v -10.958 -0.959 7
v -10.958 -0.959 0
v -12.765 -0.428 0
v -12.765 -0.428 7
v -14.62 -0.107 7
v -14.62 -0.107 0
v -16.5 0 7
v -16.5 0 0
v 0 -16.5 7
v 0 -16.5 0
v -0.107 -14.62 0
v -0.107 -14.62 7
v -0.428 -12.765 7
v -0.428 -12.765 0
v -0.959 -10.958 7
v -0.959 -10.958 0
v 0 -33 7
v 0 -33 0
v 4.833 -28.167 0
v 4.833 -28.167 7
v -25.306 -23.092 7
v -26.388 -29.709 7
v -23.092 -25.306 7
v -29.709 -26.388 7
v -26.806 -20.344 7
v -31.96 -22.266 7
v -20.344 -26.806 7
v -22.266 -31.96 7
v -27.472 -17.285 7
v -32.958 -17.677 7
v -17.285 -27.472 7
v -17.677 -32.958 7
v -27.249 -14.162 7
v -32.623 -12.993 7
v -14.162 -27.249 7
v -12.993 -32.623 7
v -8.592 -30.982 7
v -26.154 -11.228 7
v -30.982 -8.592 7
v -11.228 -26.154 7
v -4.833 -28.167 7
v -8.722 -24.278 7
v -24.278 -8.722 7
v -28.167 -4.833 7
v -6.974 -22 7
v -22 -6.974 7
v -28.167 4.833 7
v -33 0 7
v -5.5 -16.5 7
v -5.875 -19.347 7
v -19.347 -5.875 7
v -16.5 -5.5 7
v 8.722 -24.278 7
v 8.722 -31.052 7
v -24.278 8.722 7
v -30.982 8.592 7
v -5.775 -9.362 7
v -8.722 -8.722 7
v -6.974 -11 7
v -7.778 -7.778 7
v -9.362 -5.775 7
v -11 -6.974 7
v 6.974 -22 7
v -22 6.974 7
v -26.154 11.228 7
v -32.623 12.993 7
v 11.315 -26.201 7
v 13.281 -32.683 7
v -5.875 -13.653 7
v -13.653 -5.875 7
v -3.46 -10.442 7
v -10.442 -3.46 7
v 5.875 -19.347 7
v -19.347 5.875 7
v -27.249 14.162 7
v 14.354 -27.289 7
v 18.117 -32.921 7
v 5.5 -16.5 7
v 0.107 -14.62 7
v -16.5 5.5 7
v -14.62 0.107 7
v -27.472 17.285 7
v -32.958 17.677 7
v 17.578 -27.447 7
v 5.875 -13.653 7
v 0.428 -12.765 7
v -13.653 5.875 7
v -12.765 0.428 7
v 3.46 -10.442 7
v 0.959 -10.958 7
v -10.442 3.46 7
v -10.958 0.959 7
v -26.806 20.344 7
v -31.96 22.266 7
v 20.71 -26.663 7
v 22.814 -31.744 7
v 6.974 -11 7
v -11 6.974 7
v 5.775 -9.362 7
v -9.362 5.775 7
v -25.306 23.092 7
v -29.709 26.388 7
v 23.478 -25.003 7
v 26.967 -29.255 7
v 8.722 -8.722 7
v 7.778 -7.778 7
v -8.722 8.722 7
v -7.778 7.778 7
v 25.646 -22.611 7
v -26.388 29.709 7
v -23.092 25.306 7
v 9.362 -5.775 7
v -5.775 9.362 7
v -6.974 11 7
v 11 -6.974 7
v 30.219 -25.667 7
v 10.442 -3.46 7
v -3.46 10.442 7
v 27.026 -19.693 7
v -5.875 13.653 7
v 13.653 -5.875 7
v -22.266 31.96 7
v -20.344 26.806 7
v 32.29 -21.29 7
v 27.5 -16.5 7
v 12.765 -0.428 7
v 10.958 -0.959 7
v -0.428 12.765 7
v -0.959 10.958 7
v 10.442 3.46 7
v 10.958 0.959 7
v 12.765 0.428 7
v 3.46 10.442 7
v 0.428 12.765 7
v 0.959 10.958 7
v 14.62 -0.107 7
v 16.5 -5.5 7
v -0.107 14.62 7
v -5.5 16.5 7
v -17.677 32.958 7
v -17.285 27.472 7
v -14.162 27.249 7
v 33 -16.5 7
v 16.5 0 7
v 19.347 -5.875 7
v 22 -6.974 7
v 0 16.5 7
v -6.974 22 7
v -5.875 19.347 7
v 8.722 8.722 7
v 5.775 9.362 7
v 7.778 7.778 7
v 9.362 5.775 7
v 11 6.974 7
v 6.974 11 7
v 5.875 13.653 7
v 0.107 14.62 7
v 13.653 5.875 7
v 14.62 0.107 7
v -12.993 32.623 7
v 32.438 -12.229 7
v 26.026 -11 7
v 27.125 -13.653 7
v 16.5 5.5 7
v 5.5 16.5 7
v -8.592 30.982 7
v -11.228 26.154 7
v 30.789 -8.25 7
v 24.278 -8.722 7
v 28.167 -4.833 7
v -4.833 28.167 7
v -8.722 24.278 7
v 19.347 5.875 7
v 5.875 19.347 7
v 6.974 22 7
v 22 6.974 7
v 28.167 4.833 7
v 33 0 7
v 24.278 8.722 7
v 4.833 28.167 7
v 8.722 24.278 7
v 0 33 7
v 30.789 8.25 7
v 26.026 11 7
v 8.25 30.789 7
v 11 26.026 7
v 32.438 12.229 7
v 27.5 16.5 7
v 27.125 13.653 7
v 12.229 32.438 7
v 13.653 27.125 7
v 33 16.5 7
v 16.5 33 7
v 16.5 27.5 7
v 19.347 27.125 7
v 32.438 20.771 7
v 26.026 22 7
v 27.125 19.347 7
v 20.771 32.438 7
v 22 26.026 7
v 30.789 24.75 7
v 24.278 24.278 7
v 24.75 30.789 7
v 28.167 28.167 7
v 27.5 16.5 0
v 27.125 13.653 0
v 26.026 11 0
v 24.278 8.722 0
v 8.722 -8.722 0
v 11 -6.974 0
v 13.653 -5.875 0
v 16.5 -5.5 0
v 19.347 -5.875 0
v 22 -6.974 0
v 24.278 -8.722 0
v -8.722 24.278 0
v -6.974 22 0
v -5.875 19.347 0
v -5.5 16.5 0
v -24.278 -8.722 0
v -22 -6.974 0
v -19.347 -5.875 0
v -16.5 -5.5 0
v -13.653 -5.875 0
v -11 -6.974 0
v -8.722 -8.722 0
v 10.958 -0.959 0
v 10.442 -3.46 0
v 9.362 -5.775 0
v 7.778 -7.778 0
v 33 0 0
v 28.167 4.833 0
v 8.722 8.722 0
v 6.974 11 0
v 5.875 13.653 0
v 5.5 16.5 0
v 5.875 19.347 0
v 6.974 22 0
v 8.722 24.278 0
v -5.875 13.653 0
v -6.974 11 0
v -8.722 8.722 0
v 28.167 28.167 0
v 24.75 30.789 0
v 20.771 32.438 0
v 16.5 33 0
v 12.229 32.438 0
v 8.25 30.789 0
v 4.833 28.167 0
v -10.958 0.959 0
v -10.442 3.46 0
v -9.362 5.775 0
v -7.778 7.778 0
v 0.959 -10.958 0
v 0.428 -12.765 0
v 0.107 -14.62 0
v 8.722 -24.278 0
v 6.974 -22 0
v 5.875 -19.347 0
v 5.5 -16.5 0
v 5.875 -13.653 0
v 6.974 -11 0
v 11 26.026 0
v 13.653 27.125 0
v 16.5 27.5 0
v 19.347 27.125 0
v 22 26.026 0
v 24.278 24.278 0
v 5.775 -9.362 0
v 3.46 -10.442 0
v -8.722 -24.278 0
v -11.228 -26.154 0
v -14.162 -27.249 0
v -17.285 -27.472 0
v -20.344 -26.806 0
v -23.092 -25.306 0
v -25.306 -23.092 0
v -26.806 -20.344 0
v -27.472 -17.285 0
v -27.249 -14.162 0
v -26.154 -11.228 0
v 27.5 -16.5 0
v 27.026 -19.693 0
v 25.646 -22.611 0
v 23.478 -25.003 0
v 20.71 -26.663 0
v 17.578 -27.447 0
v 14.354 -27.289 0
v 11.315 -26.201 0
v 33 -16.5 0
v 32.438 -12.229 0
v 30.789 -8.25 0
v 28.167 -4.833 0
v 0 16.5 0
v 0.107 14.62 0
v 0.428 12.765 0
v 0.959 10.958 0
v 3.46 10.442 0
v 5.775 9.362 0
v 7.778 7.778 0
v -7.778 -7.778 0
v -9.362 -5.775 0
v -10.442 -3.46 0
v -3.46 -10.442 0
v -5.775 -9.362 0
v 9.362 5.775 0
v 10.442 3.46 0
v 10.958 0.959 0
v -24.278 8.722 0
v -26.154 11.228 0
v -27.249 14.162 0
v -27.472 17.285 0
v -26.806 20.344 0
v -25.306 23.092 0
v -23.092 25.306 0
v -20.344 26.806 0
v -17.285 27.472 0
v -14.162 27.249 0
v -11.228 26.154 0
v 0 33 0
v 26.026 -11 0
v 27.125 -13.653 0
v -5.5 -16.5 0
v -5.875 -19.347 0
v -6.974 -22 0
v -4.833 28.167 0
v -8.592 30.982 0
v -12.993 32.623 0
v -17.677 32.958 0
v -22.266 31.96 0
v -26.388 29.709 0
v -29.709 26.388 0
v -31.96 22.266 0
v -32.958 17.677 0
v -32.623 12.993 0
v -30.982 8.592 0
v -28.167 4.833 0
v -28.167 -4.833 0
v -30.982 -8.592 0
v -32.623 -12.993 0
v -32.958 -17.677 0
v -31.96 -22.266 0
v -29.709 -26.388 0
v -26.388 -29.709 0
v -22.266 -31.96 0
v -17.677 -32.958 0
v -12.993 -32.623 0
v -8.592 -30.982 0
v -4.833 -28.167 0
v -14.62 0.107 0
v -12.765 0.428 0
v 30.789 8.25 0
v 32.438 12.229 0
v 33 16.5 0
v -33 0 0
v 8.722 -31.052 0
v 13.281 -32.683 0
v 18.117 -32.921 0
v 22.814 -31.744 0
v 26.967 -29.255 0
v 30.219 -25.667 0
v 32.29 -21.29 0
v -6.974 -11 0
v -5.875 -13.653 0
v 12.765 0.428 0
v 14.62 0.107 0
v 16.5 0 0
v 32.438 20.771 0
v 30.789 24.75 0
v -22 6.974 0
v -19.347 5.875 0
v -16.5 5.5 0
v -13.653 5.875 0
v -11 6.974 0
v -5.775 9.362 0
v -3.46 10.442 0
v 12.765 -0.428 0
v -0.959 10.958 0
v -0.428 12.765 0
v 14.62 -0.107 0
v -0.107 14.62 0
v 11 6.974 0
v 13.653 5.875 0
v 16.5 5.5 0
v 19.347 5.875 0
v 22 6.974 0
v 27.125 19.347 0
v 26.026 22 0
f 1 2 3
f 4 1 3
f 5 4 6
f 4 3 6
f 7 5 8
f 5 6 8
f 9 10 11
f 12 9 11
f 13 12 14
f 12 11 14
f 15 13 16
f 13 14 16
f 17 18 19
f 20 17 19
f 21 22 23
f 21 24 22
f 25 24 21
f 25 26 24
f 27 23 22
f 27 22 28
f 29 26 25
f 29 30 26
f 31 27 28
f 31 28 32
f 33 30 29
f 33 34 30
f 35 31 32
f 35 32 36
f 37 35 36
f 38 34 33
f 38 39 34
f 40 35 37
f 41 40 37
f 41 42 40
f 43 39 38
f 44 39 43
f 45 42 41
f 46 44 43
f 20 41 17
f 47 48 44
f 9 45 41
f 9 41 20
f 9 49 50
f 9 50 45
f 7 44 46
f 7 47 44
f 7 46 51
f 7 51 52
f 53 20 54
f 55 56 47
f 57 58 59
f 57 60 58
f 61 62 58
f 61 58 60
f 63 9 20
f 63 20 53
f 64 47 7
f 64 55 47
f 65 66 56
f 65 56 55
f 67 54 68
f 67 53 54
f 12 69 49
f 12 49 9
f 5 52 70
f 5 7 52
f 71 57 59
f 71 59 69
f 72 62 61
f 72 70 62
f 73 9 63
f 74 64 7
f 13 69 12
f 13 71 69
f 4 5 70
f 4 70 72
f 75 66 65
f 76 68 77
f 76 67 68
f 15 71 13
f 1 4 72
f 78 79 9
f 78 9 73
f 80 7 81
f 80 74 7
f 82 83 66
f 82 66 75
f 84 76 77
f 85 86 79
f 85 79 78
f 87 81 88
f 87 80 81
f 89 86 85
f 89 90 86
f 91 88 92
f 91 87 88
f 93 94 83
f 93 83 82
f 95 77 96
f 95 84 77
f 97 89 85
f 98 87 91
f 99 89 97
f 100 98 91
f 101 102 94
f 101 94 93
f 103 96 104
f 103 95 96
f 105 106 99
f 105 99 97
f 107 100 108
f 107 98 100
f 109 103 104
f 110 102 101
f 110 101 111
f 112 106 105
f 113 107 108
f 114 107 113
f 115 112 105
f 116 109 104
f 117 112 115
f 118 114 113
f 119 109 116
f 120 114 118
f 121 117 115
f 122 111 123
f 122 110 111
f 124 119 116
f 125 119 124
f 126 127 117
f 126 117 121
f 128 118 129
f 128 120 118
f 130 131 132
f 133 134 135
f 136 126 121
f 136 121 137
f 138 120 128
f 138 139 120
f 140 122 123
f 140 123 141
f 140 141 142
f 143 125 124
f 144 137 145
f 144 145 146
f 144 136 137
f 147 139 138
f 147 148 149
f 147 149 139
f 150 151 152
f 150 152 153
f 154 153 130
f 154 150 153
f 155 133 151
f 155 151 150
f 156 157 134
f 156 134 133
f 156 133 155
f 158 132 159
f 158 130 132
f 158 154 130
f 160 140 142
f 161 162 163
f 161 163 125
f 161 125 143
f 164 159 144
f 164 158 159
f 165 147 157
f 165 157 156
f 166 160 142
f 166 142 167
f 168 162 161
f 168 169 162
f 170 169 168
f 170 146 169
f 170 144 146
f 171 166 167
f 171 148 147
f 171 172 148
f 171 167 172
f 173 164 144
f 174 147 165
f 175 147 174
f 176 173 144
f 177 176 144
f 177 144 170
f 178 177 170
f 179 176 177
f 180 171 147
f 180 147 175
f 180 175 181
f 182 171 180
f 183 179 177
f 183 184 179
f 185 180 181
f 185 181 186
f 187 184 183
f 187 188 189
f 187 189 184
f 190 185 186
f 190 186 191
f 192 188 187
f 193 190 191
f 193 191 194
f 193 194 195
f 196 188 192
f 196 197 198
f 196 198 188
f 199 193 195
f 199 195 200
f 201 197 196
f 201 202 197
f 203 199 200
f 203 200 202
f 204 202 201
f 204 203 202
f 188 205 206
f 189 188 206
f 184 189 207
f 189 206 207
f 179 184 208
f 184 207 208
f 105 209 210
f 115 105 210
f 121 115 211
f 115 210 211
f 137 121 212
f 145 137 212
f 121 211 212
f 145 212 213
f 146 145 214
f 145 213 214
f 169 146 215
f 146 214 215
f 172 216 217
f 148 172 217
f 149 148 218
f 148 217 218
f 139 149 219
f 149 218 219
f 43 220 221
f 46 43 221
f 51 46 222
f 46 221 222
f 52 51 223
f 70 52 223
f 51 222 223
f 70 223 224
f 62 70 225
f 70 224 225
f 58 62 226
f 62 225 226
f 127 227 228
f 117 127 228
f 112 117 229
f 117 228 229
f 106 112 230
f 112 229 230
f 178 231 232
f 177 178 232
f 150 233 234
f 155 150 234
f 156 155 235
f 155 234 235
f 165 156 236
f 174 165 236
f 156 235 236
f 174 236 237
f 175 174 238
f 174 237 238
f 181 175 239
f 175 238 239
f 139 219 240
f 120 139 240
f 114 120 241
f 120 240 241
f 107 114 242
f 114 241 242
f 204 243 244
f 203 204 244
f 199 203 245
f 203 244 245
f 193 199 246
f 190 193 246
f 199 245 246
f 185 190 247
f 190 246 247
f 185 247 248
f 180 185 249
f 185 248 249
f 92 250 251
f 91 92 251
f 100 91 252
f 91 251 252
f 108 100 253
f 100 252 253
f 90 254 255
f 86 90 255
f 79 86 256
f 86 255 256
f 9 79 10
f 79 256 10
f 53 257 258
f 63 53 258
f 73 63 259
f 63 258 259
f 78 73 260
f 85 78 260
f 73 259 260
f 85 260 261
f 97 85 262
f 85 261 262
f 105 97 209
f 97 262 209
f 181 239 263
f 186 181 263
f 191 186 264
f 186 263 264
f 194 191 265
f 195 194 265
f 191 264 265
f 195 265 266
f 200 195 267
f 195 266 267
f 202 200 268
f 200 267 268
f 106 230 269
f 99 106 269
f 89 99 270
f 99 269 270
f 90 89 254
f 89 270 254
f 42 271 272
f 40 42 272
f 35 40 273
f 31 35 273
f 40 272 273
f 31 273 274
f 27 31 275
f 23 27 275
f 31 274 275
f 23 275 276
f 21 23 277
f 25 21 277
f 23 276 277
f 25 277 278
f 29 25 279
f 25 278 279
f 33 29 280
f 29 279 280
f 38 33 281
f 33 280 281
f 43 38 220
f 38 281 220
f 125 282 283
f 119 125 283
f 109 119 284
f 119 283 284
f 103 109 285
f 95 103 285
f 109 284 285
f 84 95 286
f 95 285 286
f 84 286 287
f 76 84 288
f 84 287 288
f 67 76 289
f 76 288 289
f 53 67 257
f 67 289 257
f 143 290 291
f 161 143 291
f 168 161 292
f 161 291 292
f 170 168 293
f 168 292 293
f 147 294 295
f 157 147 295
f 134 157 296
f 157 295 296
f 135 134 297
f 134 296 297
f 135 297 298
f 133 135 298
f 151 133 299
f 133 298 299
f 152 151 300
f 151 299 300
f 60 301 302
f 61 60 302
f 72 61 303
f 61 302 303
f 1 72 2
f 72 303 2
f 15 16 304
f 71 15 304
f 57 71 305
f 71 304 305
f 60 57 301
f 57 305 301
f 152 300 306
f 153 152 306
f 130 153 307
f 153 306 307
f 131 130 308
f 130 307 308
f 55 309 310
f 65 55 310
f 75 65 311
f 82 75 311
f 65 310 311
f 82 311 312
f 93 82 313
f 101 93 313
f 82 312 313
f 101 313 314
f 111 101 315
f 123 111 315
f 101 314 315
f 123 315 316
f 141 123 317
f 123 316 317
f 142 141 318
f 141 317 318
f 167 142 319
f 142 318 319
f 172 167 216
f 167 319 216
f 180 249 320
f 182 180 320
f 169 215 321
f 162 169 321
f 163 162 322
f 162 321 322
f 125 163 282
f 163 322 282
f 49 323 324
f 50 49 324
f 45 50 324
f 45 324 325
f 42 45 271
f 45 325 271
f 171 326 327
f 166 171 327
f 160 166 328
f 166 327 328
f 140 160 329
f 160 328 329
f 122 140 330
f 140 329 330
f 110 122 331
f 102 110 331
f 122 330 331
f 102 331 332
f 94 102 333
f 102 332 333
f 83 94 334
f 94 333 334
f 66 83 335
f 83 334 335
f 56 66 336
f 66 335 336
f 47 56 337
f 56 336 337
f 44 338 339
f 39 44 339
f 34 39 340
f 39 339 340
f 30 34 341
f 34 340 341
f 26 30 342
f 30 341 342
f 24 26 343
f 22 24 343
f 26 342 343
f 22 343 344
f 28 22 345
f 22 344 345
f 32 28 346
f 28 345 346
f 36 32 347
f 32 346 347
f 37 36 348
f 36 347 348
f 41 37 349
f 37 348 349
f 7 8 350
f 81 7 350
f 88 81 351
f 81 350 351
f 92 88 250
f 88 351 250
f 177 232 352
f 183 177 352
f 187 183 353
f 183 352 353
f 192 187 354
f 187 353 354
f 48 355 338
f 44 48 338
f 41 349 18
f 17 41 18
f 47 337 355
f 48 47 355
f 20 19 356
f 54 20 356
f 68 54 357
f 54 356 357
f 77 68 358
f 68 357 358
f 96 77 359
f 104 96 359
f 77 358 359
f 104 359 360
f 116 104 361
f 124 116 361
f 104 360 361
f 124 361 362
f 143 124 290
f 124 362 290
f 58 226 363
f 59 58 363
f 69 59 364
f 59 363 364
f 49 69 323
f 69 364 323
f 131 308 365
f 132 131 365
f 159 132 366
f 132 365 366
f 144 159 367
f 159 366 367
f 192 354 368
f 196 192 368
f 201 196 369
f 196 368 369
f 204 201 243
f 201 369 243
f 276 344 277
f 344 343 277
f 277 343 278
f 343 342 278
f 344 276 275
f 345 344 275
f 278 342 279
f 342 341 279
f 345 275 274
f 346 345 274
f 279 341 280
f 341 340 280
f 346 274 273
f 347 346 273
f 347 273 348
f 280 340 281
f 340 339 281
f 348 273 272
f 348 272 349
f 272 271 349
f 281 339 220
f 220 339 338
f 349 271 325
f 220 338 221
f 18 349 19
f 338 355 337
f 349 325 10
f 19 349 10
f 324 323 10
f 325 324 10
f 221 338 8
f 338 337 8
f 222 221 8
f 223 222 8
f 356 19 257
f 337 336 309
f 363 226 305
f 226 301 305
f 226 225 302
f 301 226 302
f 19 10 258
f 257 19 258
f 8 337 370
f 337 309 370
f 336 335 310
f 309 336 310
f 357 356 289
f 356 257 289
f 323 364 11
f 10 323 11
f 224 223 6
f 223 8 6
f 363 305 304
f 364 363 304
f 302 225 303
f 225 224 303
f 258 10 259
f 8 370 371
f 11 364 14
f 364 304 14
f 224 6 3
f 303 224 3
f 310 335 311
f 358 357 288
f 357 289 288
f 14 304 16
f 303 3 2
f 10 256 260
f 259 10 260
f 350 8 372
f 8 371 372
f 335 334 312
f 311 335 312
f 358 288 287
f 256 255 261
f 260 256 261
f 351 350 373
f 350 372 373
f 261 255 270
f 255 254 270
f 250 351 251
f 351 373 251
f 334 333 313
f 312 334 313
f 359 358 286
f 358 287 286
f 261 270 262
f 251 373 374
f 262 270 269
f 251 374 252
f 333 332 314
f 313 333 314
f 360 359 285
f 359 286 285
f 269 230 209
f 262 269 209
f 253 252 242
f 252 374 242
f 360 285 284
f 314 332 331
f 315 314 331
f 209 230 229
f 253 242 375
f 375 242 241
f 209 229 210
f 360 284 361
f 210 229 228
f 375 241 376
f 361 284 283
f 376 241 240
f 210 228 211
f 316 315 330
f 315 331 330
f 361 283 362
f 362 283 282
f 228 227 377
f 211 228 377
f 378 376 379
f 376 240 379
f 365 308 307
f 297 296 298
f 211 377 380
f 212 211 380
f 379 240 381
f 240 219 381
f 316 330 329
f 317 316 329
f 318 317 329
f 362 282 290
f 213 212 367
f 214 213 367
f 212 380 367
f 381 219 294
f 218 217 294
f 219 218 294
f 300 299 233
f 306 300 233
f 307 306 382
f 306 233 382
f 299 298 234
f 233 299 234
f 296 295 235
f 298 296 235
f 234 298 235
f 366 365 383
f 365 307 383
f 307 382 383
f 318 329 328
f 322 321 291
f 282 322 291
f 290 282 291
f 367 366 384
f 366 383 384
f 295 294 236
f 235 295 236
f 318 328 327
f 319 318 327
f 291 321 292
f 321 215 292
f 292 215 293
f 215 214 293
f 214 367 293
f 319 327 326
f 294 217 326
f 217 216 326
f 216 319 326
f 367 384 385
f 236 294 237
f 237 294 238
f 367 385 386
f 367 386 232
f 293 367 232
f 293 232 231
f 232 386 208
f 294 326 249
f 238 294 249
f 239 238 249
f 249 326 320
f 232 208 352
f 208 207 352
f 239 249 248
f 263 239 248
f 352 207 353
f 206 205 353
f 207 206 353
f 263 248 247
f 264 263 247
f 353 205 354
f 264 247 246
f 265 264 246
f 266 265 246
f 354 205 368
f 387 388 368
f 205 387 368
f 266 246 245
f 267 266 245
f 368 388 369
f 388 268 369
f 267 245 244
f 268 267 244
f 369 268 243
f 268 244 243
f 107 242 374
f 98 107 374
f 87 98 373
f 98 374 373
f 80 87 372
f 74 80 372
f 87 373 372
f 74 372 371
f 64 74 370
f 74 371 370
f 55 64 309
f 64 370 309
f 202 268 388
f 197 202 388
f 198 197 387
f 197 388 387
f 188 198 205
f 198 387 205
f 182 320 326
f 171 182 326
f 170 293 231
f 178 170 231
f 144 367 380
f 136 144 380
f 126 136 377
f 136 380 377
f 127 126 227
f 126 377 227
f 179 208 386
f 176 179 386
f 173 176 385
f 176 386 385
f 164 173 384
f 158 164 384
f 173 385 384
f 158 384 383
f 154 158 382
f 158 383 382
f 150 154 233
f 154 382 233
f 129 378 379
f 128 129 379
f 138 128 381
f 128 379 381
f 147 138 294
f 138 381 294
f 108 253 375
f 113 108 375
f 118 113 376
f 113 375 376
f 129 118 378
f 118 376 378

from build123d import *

# Parameters (mm, degrees)
F1_DEPTH = 7


with BuildPart() as f1:
    # F0 (on Top) → F1 (new body)
    with BuildSketch(Plane.XY):
        with BuildLine():
            ThreePointArc((7.7781745931, 7.7781745931), (9.9694294001, 4.6487070714), (10.9581597192, 0.9585069475))
            ThreePointArc((10.9581597192, 0.9585069475), (13.6879398448, 0.2413925048), (16.5, 0))
            ThreePointArc((16.5, 0), (22.814276634, 1.2559877136), (28.1672618896, 4.8327381104))
            Line((28.1672618896, 4.8327381104), (24.2781745931, 8.7218254069))
            ThreePointArc((24.2781745931, 8.7218254069), (16.5, 5.5), (8.7218254069, 8.7218254069))
            Line((8.7218254069, 8.7218254069), (7.7781745931, 7.7781745931))
        make_face()
        with BuildLine():
            ThreePointArc((16.5, 0), (13.6879398448, -0.2413925048), (10.9581597192, -0.9585069475))
            ThreePointArc((10.9581597192, -0.9585069475), (9.9694294001, -4.6487070714), (7.7781745931, -7.7781745931))
            Line((7.7781745931, -7.7781745931), (8.7218254069, -8.7218254069))
            ThreePointArc((8.7218254069, -8.7218254069), (16.5, -5.5), (24.2781745931, -8.7218254069))
            Line((24.2781745931, -8.7218254069), (28.1672618896, -4.8327381104))
            ThreePointArc((28.1672618896, -4.8327381104), (22.814276634, -1.2559877136), (16.5, 0))
        make_face()
        with BuildLine():
            ThreePointArc((28.1672618896, 4.8327381104), (22.814276634, 1.2559877136), (16.5, 0))
            Line((16.5, 0), (33, 0))
            Line((33, 0), (28.1672618896, 4.8327381104))
        make_face()
        with BuildLine():
            Line((33, 0), (16.5, 0))
            ThreePointArc((16.5, 0), (22.814276634, -1.2559877136), (28.1672618896, -4.8327381104))
            Line((28.1672618896, -4.8327381104), (33, 0))
        make_face()
        with BuildLine():
            ThreePointArc((0.9585069475, 10.9581597192), (4.6487070714, 9.9694294001), (7.7781745931, 7.7781745931))
            Line((7.7781745931, 7.7781745931), (8.7218254069, 8.7218254069))
            ThreePointArc((8.7218254069, 8.7218254069), (5.5, 16.5), (8.7218254069, 24.2781745931))
            Line((8.7218254069, 24.2781745931), (4.8327381104, 28.1672618896))
            ThreePointArc((4.8327381104, 28.1672618896), (1.2559877136, 22.814276634), (0, 16.5))
            ThreePointArc((0, 16.5), (0.2413925048, 13.6879398448), (0.9585069475, 10.9581597192))
        make_face()
        with BuildLine():
            Line((8.7218254069, -8.7218254069), (7.7781745931, -7.7781745931))
            ThreePointArc((7.7781745931, -7.7781745931), (4.6487070714, -9.9694294001), (0.9585069475, -10.9581597192))
            ThreePointArc((0.9585069475, -10.9581597192), (0.2413925048, -13.6879398448), (0, -16.5))
            ThreePointArc((0, -16.5), (1.2559877136, -22.814276634), (4.8327381104, -28.1672618896))
            Line((4.8327381104, -28.1672618896), (8.7218254069, -24.2781745931))
            ThreePointArc((8.7218254069, -24.2781745931), (5.5, -16.5), (8.7218254069, -8.7218254069))
        make_face()
        with BuildLine():
            Line((24.2781745931, 8.7218254069), (28.1672618896, 4.8327381104))
            ThreePointArc((28.1672618896, 4.8327381104), (31.7440122864, 10.185723366), (33, 16.5))
            ThreePointArc((33, 16.5), (31.7440122864, 22.814276634), (28.1672618896, 28.1672618896))
            Line((28.1672618896, 28.1672618896), (24.2781745931, 24.2781745931))
            ThreePointArc((24.2781745931, 24.2781745931), (26.6626748576, 20.709517756), (27.5, 16.5))
            ThreePointArc((27.5, 16.5), (26.6626748576, 12.290482244), (24.2781745931, 8.7218254069))
        make_face()
        with BuildLine():
            ThreePointArc((33, -16.5), (31.7440122864, -10.185723366), (28.1672618896, -4.8327381104))
            Line((28.1672618896, -4.8327381104), (24.2781745931, -8.7218254069))
            ThreePointArc((24.2781745931, -8.7218254069), (26.6626748576, -12.290482244), (27.5, -16.5))
            ThreePointArc((27.5, -16.5), (20.709517756, -26.6626748576), (8.7218254069, -24.2781745931))
            Line((8.7218254069, -24.2781745931), (4.8327381104, -28.1672618896))
            ThreePointArc((4.8327381104, -28.1672618896), (22.814276634, -31.7440122864), (33, -16.5))
        make_face()
        with BuildLine():
            Line((-8.7218254069, -8.7218254069), (-7.7781745931, -7.7781745931))
            ThreePointArc((-7.7781745931, -7.7781745931), (-9.9694294001, -4.6487070714), (-10.9581597192, -0.9585069475))
            ThreePointArc((-10.9581597192, -0.9585069475), (-13.6879398448, -0.2413925048), (-16.5, 0))
            ThreePointArc((-16.5, 0), (-22.814276634, -1.2559877136), (-28.1672618896, -4.8327381104))
            Line((-28.1672618896, -4.8327381104), (-24.2781745931, -8.7218254069))
            ThreePointArc((-24.2781745931, -8.7218254069), (-16.5, -5.5), (-8.7218254069, -8.7218254069))
        make_face()
        with BuildLine():
            ThreePointArc((-0.9585069475, -10.9581597192), (-4.6487070714, -9.9694294001), (-7.7781745931, -7.7781745931))
            Line((-7.7781745931, -7.7781745931), (-8.7218254069, -8.7218254069))
            ThreePointArc((-8.7218254069, -8.7218254069), (-6.3373251424, -12.290482244), (-5.5, -16.5))
            ThreePointArc((-5.5, -16.5), (-6.3373251424, -20.709517756), (-8.7218254069, -24.2781745931))
            Line((-8.7218254069, -24.2781745931), (-4.8327381104, -28.1672618896))
            ThreePointArc((-4.8327381104, -28.1672618896), (-1.2559877136, -22.814276634), (0, -16.5))
            ThreePointArc((0, -16.5), (-0.2413925048, -13.6879398448), (-0.9585069475, -10.9581597192))
        make_face()
        with BuildLine():
            ThreePointArc((-16.5, 0), (-13.6879398448, 0.2413925048), (-10.9581597192, 0.9585069475))
            ThreePointArc((-10.9581597192, 0.9585069475), (-9.9694294001, 4.6487070714), (-7.7781745931, 7.7781745931))
            Line((-7.7781745931, 7.7781745931), (-8.7218254069, 8.7218254069))
            ThreePointArc((-8.7218254069, 8.7218254069), (-16.5, 5.5), (-24.2781745931, 8.7218254069))
            Line((-24.2781745931, 8.7218254069), (-28.1672618896, 4.8327381104))
            ThreePointArc((-28.1672618896, 4.8327381104), (-22.814276634, 1.2559877136), (-16.5, 0))
        make_face()
        with BuildLine():
            ThreePointArc((-28.1672618896, -4.8327381104), (-22.814276634, -1.2559877136), (-16.5, 0))
            Line((-16.5, 0), (-33, 0))
            Line((-33, 0), (-28.1672618896, -4.8327381104))
        make_face()
        with BuildLine():
            Line((-33, 0), (-16.5, 0))
            ThreePointArc((-16.5, 0), (-22.814276634, 1.2559877136), (-28.1672618896, 4.8327381104))
            Line((-28.1672618896, 4.8327381104), (-33, 0))
        make_face()
        with BuildLine():
            ThreePointArc((-7.7781745931, 7.7781745931), (-4.6487070714, 9.9694294001), (-0.9585069475, 10.9581597192))
            ThreePointArc((-0.9585069475, 10.9581597192), (-0.2413925048, 13.6879398448), (0, 16.5))
            ThreePointArc((0, 16.5), (-1.2559877136, 22.814276634), (-4.8327381104, 28.1672618896))
            Line((-4.8327381104, 28.1672618896), (-8.7218254069, 24.2781745931))
            ThreePointArc((-8.7218254069, 24.2781745931), (-6.3373251424, 20.709517756), (-5.5, 16.5))
            ThreePointArc((-5.5, 16.5), (-6.3373251424, 12.290482244), (-8.7218254069, 8.7218254069))
            Line((-8.7218254069, 8.7218254069), (-7.7781745931, 7.7781745931))
        make_face()
        with BuildLine():
            ThreePointArc((-4.8327381104, 28.1672618896), (-1.2559877136, 22.814276634), (0, 16.5))
            ThreePointArc((0, 16.5), (1.2559877136, 22.814276634), (4.8327381104, 28.1672618896))
            Line((4.8327381104, 28.1672618896), (0, 33))
            Line((0, 33), (-4.8327381104, 28.1672618896))
        make_face()
        with BuildLine():
            Line((4.8327381104, 28.1672618896), (8.7218254069, 24.2781745931))
            ThreePointArc((8.7218254069, 24.2781745931), (16.5, 27.5), (24.2781745931, 24.2781745931))
            Line((24.2781745931, 24.2781745931), (28.1672618896, 28.1672618896))
            ThreePointArc((28.1672618896, 28.1672618896), (16.5, 33), (4.8327381104, 28.1672618896))
        make_face()
        with BuildLine():
            ThreePointArc((4.8327381104, -28.1672618896), (1.2559877136, -22.814276634), (0, -16.5))
            ThreePointArc((0, -16.5), (-1.2559877136, -22.814276634), (-4.8327381104, -28.1672618896))
            Line((-4.8327381104, -28.1672618896), (0, -33))
            Line((0, -33), (4.8327381104, -28.1672618896))
        make_face()
        with BuildLine():
            ThreePointArc((-4.8327381104, 28.1672618896), (-28.1672618896, 28.1672618896), (-28.1672618896, 4.8327381104))
            Line((-28.1672618896, 4.8327381104), (-24.2781745931, 8.7218254069))
            ThreePointArc((-24.2781745931, 8.7218254069), (-24.2781745931, 24.2781745931), (-8.7218254069, 24.2781745931))
            Line((-8.7218254069, 24.2781745931), (-4.8327381104, 28.1672618896))
        make_face()
        with BuildLine():
            Line((-24.2781745931, -8.7218254069), (-28.1672618896, -4.8327381104))
            ThreePointArc((-28.1672618896, -4.8327381104), (-28.1672618896, -28.1672618896), (-4.8327381104, -28.1672618896))
            Line((-4.8327381104, -28.1672618896), (-8.7218254069, -24.2781745931))
            ThreePointArc((-8.7218254069, -24.2781745931), (-24.2781745931, -24.2781745931), (-24.2781745931, -8.7218254069))
        make_face()
    extrude(amount=F1_DEPTH)


solid = f1.part
